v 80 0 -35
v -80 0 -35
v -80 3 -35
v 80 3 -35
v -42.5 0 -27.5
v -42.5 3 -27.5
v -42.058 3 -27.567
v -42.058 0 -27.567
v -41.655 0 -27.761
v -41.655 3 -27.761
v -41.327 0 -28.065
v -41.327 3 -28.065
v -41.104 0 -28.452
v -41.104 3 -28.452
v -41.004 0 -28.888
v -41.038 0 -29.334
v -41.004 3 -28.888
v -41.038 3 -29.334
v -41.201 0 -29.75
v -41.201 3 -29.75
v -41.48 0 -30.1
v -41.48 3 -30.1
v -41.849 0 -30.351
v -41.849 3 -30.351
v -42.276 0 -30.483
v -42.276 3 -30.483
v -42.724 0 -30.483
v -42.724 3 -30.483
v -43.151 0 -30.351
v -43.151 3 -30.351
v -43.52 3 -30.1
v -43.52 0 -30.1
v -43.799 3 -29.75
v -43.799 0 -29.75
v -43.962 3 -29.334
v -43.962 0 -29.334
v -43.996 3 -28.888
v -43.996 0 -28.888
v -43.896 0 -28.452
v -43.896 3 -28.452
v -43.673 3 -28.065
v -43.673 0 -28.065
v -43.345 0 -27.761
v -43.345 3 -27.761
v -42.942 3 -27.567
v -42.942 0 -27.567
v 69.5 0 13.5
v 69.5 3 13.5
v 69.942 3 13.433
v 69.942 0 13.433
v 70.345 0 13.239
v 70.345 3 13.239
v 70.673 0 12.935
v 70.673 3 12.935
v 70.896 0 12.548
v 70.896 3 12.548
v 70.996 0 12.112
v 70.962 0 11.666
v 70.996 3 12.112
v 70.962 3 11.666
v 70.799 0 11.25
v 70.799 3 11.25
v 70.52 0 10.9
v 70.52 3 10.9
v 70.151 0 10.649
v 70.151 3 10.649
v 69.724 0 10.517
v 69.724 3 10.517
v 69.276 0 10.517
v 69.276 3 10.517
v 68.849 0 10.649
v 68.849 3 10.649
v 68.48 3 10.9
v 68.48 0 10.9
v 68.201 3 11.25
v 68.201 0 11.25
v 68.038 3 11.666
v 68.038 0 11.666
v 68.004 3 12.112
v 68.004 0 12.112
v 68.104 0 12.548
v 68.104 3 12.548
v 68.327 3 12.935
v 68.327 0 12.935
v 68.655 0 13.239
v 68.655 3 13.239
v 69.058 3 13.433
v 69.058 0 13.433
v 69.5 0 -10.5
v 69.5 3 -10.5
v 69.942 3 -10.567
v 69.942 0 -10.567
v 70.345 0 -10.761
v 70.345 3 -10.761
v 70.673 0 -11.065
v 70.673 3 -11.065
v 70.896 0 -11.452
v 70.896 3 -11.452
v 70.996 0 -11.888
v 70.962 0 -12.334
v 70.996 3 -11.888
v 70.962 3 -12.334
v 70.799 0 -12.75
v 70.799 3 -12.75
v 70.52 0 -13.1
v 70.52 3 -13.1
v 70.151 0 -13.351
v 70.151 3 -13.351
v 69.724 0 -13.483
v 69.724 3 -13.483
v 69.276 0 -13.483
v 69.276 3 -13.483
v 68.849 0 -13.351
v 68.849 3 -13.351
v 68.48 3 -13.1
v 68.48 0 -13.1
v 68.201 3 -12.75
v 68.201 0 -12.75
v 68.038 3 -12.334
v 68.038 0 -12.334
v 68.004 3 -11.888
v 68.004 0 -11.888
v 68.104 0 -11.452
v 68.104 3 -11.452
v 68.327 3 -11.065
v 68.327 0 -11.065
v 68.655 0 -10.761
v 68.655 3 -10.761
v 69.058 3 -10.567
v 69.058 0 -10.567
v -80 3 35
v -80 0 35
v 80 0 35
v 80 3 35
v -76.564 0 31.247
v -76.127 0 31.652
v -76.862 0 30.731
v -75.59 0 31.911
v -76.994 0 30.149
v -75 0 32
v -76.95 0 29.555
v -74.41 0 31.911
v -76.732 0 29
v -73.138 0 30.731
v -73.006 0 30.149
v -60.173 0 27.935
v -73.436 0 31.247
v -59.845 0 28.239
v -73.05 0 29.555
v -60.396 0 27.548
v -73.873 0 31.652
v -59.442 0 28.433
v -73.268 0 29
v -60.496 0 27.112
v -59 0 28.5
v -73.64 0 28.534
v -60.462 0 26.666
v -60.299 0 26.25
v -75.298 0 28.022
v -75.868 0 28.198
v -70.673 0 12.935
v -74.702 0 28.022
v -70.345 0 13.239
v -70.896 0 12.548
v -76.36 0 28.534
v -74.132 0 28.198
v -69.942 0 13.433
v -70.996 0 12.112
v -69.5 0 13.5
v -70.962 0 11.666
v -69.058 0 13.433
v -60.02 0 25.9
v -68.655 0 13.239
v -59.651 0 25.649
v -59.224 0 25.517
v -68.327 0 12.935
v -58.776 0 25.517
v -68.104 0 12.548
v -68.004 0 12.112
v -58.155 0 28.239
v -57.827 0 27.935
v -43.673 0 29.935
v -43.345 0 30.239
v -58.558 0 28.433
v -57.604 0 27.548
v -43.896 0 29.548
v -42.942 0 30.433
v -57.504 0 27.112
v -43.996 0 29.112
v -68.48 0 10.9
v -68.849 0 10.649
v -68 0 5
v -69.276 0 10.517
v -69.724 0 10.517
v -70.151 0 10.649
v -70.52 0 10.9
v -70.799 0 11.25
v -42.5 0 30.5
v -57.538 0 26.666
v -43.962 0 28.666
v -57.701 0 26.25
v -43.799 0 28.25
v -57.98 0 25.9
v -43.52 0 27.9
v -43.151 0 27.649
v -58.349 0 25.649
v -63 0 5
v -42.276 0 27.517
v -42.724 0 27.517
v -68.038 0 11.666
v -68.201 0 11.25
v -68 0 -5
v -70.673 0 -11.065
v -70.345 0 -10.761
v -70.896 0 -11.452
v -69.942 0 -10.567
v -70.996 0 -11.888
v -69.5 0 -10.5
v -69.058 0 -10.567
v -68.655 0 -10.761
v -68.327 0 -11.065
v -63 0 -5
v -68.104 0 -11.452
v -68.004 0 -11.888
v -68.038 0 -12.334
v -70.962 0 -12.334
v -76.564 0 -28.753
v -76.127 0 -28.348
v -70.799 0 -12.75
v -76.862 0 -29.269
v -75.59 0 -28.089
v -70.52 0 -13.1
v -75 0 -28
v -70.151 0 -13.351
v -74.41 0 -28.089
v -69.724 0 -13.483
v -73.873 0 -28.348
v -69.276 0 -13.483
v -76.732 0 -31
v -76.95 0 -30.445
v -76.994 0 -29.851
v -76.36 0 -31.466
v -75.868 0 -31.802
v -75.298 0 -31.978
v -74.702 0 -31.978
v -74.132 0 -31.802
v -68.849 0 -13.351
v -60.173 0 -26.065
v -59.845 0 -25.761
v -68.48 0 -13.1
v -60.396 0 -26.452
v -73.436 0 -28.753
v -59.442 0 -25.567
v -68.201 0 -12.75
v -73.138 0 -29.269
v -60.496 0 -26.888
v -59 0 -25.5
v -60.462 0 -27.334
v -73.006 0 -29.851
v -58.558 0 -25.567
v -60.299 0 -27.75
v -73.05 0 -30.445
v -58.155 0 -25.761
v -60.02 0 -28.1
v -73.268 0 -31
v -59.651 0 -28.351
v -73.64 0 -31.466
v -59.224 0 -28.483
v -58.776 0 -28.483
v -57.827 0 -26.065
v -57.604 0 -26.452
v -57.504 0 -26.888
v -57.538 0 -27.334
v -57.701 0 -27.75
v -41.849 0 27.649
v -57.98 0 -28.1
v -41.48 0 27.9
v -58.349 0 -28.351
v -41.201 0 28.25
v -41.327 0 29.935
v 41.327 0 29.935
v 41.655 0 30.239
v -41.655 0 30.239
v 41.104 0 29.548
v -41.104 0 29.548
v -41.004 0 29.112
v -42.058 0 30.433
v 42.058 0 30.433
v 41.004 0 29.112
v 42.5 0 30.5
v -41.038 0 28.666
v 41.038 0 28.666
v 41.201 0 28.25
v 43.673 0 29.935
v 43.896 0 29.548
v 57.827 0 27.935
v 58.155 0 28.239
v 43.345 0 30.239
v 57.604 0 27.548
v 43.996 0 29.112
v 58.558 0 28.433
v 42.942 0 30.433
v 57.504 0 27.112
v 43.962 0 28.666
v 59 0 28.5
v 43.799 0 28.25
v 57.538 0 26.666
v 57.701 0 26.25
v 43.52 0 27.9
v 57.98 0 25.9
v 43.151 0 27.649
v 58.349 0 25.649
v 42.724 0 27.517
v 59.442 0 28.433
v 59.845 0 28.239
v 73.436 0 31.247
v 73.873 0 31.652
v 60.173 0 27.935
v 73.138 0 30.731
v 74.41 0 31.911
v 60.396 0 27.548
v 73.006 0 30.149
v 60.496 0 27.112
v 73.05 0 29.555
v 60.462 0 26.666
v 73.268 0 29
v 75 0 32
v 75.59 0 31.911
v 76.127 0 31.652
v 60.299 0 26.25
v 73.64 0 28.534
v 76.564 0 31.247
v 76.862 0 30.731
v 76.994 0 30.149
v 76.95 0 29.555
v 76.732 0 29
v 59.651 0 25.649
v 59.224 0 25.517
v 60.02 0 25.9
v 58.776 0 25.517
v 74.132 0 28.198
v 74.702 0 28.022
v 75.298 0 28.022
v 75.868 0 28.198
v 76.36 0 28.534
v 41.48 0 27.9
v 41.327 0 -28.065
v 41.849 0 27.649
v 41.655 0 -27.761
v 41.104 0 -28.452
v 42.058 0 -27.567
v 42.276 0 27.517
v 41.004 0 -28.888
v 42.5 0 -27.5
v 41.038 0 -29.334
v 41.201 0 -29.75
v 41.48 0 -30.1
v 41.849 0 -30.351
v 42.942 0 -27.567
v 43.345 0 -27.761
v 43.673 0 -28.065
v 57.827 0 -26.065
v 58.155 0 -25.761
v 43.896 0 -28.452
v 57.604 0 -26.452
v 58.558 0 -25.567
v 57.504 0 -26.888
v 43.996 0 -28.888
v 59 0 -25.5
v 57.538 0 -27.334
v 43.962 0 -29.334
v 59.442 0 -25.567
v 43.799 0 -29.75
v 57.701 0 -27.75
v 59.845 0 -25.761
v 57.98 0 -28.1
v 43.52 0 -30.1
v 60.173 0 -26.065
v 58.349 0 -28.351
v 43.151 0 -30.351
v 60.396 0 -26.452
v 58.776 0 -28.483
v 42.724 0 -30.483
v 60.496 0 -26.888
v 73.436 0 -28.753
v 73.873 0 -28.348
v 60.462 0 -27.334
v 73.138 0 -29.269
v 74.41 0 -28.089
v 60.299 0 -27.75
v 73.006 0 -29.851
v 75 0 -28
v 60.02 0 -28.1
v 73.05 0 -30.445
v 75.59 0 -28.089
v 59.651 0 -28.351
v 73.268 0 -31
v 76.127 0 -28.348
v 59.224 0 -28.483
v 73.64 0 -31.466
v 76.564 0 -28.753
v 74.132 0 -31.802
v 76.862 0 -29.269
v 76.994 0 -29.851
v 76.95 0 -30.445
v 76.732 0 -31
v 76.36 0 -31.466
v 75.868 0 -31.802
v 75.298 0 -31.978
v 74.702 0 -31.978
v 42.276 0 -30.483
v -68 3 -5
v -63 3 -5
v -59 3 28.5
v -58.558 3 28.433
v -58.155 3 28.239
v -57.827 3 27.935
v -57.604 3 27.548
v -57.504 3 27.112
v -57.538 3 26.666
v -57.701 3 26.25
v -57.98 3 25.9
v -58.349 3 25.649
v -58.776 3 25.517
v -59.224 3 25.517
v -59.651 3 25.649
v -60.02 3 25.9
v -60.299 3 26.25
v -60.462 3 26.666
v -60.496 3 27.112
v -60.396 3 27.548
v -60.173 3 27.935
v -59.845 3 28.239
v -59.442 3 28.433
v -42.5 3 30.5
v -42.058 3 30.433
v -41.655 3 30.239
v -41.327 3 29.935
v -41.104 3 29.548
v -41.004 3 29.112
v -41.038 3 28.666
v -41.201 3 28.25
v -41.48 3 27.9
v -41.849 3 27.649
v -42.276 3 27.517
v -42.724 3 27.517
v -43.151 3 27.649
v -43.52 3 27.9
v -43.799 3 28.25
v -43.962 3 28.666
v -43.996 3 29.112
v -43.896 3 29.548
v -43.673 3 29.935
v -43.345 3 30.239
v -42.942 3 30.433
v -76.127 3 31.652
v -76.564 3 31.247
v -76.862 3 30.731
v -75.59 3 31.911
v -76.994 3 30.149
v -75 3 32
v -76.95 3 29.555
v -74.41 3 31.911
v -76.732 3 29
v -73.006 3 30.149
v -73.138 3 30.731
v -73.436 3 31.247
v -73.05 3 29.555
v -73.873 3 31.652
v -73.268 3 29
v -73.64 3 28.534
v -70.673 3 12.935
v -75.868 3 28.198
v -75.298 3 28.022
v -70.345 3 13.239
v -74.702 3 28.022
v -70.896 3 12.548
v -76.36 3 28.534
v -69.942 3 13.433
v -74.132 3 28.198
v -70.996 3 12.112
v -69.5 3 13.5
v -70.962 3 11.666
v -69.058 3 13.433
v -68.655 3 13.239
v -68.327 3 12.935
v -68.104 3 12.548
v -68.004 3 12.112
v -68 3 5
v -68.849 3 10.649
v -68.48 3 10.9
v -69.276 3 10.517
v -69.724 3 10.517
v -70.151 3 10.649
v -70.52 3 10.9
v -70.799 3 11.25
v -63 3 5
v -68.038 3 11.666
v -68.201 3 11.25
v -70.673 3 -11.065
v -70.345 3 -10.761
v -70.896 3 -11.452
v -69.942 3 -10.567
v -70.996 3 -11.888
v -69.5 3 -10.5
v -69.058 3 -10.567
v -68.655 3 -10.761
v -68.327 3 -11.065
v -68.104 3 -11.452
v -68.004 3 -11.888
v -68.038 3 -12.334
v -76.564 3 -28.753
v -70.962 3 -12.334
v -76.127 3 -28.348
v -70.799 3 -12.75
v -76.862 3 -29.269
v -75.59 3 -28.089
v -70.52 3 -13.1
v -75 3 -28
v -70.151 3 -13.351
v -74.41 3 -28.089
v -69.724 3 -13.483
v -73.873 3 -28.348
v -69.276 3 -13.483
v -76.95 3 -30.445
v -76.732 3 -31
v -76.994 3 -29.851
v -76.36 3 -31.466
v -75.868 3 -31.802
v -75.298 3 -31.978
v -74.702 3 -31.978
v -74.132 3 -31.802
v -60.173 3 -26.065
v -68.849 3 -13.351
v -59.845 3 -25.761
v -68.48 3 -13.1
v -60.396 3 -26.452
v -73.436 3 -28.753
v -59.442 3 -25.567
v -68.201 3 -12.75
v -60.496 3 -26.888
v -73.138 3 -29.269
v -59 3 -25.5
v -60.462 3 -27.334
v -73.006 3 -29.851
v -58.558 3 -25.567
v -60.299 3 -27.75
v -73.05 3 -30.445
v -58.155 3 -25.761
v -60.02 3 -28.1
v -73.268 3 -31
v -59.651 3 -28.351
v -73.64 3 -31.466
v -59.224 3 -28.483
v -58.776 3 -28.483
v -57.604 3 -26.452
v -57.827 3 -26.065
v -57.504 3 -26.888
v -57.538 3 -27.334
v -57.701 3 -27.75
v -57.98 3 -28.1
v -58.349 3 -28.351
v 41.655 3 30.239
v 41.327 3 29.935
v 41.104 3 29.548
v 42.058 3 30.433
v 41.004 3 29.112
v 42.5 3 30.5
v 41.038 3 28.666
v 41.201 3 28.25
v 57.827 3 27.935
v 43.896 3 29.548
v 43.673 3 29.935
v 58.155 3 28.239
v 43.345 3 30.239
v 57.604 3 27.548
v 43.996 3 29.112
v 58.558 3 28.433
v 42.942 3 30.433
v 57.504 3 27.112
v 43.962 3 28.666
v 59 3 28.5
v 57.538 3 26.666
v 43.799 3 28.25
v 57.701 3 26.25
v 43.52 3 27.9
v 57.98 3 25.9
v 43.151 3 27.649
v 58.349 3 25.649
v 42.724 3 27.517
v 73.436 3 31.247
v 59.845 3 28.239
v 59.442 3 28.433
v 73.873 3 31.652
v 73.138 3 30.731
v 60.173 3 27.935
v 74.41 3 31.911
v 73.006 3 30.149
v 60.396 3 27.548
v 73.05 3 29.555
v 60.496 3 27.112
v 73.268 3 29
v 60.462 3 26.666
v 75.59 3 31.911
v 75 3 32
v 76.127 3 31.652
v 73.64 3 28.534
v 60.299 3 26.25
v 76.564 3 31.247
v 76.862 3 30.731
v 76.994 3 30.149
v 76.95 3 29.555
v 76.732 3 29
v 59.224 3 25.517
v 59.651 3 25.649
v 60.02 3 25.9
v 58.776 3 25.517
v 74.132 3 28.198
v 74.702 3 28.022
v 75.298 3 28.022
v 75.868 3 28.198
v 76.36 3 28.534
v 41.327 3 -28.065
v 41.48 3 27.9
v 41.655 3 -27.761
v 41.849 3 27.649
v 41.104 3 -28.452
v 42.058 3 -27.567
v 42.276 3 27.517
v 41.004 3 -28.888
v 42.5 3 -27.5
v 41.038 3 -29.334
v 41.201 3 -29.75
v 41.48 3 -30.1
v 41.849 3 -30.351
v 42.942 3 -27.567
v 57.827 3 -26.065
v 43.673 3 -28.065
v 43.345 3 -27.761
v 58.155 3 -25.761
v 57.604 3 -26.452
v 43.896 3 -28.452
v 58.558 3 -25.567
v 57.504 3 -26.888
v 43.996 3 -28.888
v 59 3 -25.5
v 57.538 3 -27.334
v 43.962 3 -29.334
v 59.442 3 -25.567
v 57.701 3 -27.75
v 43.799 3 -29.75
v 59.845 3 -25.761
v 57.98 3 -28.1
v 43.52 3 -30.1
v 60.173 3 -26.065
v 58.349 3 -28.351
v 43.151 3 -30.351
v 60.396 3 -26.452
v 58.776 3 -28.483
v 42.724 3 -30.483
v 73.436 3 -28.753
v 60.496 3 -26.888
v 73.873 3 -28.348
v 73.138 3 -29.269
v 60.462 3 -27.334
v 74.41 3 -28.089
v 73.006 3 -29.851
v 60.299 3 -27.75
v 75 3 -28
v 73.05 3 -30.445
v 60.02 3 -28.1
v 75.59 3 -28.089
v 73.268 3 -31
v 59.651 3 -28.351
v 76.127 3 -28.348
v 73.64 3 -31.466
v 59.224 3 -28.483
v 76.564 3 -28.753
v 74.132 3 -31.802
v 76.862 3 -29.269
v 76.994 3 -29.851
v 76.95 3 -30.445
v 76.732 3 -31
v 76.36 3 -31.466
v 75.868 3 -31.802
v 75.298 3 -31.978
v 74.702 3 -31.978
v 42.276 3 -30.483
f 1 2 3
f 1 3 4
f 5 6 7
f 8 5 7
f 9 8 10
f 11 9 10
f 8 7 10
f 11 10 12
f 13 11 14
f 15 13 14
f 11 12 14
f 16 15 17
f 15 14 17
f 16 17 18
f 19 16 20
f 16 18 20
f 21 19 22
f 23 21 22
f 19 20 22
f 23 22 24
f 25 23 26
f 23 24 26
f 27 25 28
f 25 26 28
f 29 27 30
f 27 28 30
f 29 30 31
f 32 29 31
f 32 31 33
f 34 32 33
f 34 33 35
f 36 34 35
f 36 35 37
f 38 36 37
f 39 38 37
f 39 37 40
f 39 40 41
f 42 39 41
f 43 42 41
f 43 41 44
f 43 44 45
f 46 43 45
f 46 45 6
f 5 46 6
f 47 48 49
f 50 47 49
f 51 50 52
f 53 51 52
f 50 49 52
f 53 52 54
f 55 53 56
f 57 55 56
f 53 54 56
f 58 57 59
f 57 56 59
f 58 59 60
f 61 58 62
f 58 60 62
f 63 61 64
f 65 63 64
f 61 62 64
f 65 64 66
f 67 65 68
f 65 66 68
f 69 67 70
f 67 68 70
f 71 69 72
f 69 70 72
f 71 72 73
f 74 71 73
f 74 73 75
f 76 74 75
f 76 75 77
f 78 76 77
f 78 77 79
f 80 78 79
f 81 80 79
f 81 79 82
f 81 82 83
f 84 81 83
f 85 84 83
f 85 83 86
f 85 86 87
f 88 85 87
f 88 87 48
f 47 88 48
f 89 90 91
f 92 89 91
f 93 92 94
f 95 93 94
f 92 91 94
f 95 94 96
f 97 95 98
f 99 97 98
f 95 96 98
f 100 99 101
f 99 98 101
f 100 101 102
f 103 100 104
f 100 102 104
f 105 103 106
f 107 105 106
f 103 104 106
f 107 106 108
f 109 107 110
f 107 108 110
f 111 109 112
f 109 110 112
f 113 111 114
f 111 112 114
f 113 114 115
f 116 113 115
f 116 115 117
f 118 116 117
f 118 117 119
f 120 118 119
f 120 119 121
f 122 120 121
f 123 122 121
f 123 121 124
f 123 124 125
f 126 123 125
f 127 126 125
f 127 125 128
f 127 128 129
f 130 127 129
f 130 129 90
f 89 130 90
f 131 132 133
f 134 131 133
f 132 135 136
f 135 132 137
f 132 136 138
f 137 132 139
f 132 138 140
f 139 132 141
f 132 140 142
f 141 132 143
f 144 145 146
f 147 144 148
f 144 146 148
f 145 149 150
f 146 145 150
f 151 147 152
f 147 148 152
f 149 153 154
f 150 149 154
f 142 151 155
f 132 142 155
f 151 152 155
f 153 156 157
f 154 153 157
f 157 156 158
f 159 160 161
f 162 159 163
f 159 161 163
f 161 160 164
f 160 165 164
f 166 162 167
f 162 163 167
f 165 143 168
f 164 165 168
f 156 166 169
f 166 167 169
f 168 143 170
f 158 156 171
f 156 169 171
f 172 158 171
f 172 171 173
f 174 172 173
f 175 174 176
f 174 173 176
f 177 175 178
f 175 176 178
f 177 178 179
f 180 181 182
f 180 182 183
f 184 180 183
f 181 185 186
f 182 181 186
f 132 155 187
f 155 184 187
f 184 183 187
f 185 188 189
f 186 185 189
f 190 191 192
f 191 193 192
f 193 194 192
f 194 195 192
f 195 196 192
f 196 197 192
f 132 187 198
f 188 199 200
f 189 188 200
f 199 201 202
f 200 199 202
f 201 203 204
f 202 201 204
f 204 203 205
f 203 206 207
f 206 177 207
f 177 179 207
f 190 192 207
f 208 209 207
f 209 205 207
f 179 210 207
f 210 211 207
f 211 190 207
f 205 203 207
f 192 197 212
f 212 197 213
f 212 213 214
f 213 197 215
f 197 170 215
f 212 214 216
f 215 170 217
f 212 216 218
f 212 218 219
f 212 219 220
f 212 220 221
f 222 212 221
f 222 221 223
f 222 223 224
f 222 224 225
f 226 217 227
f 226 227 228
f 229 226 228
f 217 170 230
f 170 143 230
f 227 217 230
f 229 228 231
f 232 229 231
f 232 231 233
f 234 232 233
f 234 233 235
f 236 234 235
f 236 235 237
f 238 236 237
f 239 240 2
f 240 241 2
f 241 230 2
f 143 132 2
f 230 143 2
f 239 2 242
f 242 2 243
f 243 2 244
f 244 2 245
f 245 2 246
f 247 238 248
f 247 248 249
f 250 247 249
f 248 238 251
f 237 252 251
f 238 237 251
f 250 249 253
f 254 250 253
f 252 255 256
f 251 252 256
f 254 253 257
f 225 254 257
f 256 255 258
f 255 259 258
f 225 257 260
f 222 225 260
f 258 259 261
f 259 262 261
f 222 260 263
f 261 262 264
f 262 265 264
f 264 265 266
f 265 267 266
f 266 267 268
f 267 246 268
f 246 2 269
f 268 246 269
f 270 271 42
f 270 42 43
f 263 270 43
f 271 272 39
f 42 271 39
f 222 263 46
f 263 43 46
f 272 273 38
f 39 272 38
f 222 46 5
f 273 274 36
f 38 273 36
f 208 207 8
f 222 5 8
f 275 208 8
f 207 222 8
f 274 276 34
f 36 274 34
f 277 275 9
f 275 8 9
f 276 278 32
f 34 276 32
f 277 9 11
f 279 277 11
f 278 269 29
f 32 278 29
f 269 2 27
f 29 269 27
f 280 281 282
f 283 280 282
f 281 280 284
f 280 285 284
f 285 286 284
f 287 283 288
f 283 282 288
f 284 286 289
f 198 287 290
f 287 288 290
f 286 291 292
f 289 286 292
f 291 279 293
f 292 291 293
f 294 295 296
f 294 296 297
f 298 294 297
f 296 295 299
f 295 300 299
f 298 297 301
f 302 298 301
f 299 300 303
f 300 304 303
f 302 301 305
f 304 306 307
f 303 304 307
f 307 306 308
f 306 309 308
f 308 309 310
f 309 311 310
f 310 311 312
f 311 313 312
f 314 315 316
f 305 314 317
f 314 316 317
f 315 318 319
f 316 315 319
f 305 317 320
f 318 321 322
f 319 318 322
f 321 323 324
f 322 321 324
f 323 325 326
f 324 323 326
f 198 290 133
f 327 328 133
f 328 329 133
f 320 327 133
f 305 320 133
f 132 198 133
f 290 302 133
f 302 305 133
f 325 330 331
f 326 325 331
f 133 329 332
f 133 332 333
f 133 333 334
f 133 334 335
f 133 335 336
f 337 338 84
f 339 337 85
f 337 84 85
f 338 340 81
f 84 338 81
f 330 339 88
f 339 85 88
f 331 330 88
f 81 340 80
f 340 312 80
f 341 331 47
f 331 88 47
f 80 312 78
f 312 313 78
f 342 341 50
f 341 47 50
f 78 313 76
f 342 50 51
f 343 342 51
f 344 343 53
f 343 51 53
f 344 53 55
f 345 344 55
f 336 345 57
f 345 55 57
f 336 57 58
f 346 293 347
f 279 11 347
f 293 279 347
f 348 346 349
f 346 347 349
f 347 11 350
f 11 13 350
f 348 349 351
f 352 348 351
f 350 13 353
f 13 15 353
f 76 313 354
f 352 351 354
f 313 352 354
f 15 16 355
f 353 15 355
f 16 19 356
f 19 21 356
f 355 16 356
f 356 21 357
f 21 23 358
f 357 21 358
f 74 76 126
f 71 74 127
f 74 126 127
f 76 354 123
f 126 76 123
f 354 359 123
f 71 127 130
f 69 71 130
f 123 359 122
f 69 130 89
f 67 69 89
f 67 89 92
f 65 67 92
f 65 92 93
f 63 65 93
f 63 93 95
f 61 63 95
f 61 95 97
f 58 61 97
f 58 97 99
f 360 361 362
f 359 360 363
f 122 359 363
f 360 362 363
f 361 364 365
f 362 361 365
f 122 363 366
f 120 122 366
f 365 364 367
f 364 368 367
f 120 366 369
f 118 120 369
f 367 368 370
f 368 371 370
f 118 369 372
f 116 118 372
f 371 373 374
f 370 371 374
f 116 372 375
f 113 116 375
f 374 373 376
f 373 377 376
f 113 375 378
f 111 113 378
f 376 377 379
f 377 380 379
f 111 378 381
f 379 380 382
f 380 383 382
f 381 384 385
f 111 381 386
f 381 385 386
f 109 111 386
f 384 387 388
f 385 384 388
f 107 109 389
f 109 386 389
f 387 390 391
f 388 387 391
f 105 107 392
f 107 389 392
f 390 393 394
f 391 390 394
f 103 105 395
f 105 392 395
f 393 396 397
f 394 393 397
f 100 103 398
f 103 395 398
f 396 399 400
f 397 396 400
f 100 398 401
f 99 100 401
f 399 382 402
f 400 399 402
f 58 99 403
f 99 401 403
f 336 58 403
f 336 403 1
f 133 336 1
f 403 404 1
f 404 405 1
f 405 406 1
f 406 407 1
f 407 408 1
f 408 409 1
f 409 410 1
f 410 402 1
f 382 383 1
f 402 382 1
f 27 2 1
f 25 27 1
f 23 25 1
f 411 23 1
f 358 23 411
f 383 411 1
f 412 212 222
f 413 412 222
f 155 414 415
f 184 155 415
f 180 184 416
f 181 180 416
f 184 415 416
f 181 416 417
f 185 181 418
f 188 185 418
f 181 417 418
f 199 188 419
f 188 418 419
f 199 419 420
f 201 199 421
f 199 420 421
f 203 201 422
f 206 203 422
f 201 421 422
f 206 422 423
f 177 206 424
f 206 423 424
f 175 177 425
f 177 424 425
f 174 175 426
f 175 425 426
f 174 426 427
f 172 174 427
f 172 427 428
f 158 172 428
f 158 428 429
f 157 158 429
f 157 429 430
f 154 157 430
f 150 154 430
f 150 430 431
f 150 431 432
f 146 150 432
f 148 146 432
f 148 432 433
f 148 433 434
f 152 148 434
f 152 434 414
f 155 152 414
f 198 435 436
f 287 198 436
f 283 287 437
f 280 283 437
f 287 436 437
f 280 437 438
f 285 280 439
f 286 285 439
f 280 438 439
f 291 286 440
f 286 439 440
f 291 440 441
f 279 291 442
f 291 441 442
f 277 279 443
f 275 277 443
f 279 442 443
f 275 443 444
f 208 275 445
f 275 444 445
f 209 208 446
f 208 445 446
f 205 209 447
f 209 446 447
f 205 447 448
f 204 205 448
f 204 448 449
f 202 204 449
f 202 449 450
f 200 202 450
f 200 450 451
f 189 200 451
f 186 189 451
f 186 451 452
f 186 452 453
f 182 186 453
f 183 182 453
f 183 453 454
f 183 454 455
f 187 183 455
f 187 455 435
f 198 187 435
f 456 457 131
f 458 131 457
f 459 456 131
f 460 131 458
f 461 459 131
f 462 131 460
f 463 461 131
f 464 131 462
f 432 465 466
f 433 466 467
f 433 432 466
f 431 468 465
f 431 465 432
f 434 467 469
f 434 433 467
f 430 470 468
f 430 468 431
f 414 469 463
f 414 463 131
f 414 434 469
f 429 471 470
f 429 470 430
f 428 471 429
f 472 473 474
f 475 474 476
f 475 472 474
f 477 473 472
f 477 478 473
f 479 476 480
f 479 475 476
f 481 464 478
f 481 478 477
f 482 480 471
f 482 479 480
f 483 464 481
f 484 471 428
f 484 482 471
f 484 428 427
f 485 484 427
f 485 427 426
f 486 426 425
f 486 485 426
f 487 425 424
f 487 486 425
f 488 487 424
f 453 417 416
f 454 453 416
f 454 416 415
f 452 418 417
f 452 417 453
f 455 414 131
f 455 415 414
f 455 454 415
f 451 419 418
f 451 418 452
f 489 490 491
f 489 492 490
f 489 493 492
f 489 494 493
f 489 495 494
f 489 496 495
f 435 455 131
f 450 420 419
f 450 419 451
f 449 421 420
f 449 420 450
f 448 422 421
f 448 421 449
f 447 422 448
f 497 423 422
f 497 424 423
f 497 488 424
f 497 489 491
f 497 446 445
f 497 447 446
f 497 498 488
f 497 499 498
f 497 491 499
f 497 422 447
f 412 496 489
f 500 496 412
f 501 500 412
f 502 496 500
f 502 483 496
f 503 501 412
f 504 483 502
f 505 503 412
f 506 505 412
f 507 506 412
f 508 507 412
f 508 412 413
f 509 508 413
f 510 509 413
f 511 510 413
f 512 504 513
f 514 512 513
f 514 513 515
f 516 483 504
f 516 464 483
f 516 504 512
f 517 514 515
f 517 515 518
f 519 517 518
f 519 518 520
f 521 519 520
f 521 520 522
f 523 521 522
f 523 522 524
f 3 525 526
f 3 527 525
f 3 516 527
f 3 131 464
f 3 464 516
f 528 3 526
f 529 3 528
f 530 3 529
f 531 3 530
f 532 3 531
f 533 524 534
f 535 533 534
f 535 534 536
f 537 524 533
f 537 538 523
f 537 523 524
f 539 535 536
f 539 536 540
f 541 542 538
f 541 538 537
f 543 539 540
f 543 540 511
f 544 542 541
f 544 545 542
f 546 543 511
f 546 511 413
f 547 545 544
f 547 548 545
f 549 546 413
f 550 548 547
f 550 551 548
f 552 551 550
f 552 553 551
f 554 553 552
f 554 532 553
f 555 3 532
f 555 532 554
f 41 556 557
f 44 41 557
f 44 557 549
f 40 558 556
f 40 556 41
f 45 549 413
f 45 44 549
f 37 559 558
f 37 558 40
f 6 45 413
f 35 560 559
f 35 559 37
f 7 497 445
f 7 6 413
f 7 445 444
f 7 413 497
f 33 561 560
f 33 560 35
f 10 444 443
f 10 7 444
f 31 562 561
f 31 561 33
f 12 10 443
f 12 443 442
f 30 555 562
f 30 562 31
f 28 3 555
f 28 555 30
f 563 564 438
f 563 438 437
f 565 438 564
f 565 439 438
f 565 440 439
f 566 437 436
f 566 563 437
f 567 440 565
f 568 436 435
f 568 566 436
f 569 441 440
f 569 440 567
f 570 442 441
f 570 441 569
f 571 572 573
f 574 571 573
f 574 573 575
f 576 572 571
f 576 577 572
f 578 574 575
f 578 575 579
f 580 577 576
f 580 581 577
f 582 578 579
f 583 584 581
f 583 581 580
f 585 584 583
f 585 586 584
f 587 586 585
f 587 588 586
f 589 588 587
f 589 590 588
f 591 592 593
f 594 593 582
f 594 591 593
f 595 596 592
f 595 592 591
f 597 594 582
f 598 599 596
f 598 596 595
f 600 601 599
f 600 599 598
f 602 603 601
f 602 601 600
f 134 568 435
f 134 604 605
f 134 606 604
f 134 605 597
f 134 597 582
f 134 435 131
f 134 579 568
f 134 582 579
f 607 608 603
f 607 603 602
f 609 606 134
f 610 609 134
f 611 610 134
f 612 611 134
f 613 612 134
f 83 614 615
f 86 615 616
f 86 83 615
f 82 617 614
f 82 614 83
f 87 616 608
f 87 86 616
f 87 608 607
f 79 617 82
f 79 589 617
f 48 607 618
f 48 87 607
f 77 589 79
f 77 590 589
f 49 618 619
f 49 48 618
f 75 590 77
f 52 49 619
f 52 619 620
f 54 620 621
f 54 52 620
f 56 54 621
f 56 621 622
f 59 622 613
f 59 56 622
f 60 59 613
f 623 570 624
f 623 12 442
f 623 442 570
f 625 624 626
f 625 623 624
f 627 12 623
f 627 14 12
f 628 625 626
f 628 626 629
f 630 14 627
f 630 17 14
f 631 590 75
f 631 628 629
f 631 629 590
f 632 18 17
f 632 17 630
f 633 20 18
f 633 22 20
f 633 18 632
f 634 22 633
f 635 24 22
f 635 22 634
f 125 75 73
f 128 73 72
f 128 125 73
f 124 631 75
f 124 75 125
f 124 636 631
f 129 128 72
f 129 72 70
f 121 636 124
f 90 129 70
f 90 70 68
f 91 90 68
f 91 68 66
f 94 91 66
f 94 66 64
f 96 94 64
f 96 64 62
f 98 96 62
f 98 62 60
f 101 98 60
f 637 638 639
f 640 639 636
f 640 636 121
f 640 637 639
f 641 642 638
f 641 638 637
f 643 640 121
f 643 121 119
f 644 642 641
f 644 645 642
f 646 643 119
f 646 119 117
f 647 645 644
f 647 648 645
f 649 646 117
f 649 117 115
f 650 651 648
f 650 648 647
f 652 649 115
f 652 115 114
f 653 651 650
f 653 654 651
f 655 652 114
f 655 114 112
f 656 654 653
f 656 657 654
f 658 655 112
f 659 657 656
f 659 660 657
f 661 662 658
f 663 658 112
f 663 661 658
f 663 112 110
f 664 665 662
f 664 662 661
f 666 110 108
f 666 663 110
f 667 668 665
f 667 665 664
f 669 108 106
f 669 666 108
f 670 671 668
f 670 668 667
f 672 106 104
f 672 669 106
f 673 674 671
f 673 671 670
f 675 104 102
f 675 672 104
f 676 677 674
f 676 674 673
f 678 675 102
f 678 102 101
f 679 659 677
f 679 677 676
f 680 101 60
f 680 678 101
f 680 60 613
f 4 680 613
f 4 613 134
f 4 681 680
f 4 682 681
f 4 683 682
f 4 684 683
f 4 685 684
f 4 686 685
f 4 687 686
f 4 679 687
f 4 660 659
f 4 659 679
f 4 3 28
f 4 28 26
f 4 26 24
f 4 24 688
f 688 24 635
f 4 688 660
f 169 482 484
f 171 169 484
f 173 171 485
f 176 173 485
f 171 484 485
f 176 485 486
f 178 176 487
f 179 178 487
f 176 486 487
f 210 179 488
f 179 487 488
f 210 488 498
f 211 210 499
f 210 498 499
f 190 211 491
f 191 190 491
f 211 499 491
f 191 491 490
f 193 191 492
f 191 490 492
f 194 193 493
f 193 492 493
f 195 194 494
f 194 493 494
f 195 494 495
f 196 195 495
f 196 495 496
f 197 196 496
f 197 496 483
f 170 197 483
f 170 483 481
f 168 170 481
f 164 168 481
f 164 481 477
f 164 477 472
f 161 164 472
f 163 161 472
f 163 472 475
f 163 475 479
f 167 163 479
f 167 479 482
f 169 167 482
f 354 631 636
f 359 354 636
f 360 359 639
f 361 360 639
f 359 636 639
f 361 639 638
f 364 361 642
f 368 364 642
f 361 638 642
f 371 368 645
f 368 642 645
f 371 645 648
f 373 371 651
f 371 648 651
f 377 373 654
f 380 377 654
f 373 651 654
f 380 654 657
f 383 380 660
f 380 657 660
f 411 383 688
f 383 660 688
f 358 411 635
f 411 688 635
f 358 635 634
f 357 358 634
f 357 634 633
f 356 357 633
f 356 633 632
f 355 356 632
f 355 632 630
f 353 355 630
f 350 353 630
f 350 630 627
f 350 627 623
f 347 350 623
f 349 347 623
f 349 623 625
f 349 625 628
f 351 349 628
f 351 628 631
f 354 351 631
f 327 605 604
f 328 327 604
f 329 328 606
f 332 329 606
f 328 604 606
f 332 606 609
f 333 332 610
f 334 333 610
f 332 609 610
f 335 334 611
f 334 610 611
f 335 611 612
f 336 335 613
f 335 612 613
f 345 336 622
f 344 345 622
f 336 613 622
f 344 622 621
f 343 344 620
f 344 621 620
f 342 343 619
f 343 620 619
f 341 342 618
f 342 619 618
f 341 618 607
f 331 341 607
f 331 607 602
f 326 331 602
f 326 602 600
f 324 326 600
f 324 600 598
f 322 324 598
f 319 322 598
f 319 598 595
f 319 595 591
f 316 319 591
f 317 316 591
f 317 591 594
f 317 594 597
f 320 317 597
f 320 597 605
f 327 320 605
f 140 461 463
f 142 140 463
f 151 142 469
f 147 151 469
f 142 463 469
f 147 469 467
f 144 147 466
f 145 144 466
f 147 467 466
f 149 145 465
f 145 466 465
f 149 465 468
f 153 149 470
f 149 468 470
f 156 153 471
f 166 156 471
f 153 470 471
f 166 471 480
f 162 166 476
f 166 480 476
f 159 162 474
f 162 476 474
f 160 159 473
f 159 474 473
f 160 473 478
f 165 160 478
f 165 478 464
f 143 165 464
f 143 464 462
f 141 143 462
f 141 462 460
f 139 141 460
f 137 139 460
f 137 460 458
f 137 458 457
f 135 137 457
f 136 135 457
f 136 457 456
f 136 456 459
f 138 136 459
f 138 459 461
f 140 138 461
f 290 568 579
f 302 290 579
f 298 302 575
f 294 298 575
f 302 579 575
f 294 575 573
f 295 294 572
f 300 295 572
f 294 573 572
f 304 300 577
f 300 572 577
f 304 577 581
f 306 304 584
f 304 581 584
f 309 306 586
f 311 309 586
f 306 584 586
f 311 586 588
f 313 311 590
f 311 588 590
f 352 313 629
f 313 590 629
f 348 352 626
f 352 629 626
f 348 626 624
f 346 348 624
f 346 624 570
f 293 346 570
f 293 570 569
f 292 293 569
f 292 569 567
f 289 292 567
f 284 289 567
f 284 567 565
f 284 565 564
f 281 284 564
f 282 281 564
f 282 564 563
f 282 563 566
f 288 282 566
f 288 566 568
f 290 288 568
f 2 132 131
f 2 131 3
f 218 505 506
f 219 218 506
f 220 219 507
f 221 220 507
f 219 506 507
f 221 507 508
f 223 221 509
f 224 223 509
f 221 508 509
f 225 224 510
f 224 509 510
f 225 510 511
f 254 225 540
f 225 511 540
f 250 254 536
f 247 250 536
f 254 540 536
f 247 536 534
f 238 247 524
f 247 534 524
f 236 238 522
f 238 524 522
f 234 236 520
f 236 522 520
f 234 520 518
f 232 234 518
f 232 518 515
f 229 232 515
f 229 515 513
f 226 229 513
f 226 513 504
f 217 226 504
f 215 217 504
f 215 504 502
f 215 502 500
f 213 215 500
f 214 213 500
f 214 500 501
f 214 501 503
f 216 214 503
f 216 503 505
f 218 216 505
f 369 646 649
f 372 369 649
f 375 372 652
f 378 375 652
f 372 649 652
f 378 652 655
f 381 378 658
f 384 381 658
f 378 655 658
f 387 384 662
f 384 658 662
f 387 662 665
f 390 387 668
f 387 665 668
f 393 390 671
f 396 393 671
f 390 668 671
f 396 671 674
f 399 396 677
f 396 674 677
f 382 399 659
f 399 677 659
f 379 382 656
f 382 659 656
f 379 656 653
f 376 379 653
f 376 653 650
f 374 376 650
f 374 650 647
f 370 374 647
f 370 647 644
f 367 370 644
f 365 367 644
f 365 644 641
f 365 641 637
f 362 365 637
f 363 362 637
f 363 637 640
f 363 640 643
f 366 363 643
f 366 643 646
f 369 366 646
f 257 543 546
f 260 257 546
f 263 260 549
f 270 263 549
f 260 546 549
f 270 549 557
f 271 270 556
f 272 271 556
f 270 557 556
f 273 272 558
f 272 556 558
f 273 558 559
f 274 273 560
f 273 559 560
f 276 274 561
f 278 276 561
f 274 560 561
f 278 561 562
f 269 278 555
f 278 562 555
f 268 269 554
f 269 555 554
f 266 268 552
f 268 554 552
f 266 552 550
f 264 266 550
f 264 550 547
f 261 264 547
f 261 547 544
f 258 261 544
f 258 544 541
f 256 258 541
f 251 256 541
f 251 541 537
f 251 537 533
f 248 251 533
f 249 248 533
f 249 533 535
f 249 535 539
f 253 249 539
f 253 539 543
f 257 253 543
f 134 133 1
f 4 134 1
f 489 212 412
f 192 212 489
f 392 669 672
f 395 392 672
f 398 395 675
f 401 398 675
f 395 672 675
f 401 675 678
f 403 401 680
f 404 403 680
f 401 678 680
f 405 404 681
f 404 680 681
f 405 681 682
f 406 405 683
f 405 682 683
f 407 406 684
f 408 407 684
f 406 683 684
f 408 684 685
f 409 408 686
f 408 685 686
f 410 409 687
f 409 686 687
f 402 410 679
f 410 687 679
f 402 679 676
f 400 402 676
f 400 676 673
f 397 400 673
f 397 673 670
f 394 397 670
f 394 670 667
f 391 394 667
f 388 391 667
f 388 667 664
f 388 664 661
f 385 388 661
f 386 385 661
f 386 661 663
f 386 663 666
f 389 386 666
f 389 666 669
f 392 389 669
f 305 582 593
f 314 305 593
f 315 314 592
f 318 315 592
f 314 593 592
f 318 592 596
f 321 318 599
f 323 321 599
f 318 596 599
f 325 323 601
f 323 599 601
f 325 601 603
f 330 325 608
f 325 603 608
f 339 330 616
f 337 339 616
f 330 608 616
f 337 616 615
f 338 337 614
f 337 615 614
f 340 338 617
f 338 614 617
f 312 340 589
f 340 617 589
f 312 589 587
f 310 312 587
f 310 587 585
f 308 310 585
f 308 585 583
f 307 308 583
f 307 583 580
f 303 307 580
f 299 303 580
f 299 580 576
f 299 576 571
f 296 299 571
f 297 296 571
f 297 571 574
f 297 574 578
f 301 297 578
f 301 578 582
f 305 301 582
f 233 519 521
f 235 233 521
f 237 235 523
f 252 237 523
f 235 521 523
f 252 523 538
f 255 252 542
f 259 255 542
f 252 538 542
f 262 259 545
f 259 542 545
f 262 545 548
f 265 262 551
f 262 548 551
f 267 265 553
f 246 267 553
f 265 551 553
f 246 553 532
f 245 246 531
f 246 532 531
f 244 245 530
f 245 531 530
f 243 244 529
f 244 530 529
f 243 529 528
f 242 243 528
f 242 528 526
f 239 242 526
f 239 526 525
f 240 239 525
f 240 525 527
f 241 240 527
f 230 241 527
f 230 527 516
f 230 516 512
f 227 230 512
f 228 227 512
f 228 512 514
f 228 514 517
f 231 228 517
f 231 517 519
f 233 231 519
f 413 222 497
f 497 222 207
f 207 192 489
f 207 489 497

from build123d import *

# Parameters (mm, degrees)
SKETCH1_W      = 160
SKETCH1_H      = 70
EXTRUDE1_DEPTH = 3
SKETCH2_R      = 2
EXTRUDE2_DEPTH = 120
SKETCH3_R      = 1.5
EXTRUDE3_DEPTH = 10
SKETCH4_R      = 1.5
EXTRUDE4_DEPTH = 10
SKETCH5_R      = 1.5
EXTRUDE5_DEPTH = 10
SKETCH6_W      = 5
SKETCH6_H      = 10
EXTRUDE6_DEPTH = 5


with BuildPart() as part:
    # Sketch1 → Extrude1 (new body)
    with BuildSketch(Plane(origin=(0, 0, 0), x_dir=(1, 0, 0), z_dir=(0, 1, 0))):
        Rectangle(SKETCH1_W, SKETCH1_H)
    extrude(amount=EXTRUDE1_DEPTH)

    # Sketch2 → Extrude2 (cut)
    with BuildSketch(Plane(origin=(0, 3, 0), x_dir=(1, 0, 0), z_dir=(0, 1, 0))):
        with Locations(Location((-75, 30, 0), (0, 0, 270))):
            Circle(SKETCH2_R)
        with Locations(Location((-75, -30, 0), (0, 0, 270))):
            Circle(SKETCH2_R)
        with Locations(Location((75, -30, 0), (0, 0, 270))):
            Circle(SKETCH2_R)
        with Locations(Location((75, 30, 0), (0, 0, 270))):
            Circle(SKETCH2_R)
    extrude(amount=-EXTRUDE2_DEPTH, mode=Mode.SUBTRACT)

    # Sketch3 → Extrude3 (cut)
    with BuildSketch(Plane(origin=(0, 3, 0), x_dir=(1, 0, 0), z_dir=(0, 1, 0))):
        with Locations(Location((-59, 27, 0), (0, 0, 270))):
            Circle(SKETCH3_R)
        with Locations(Location((-59, -27, 0), (0, 0, 270))):
            Circle(SKETCH3_R)
        with Locations(Location((59, -27, 0), (0, 0, 270))):
            Circle(SKETCH3_R)
        with Locations(Location((59, 27, 0), (0, 0, 270))):
            Circle(SKETCH3_R)
    extrude(amount=-EXTRUDE3_DEPTH, mode=Mode.SUBTRACT)

    # Sketch4 → Extrude4 (cut)
    with BuildSketch(Plane(origin=(0, 3, 0), x_dir=(1, 0, 0), z_dir=(0, 1, 0))):
        with Locations(Location((-69.5, 12, 0), (0, 0, 270))):
            Circle(SKETCH4_R)
        with Locations(Location((-69.5, -12, 0), (0, 0, 270))):
            Circle(SKETCH4_R)
        with Locations(Location((69.5, -12, 0), (0, 0, 270))):
            Circle(SKETCH4_R)
        with Locations(Location((69.5, 12, 0), (0, 0, 270))):
            Circle(SKETCH4_R)
    extrude(amount=-EXTRUDE4_DEPTH, mode=Mode.SUBTRACT)

    # Sketch5 → Extrude5 (cut)
    with BuildSketch(Plane(origin=(0, 3, 0), x_dir=(1, 0, 0), z_dir=(0, 1, 0))):
        with Locations(Location((-42.5, 29, 0), (0, 0, 270))):
            Circle(SKETCH5_R)
        with Locations(Location((-42.5, -29, 0), (0, 0, 270))):
            Circle(SKETCH5_R)
        with Locations(Location((42.5, -29, 0), (0, 0, 270))):
            Circle(SKETCH5_R)
        with Locations(Location((42.5, 29, 0), (0, 0, 270))):
            Circle(SKETCH5_R)
    extrude(amount=-EXTRUDE5_DEPTH, mode=Mode.SUBTRACT)

    # Sketch6 → Extrude6 (cut)
    with BuildSketch(Plane.XZ):
        with Locations((-65.5, 0)):
            Rectangle(SKETCH6_W, SKETCH6_H)
    extrude(amount=-EXTRUDE6_DEPTH, mode=Mode.SUBTRACT)


solid = part.part
